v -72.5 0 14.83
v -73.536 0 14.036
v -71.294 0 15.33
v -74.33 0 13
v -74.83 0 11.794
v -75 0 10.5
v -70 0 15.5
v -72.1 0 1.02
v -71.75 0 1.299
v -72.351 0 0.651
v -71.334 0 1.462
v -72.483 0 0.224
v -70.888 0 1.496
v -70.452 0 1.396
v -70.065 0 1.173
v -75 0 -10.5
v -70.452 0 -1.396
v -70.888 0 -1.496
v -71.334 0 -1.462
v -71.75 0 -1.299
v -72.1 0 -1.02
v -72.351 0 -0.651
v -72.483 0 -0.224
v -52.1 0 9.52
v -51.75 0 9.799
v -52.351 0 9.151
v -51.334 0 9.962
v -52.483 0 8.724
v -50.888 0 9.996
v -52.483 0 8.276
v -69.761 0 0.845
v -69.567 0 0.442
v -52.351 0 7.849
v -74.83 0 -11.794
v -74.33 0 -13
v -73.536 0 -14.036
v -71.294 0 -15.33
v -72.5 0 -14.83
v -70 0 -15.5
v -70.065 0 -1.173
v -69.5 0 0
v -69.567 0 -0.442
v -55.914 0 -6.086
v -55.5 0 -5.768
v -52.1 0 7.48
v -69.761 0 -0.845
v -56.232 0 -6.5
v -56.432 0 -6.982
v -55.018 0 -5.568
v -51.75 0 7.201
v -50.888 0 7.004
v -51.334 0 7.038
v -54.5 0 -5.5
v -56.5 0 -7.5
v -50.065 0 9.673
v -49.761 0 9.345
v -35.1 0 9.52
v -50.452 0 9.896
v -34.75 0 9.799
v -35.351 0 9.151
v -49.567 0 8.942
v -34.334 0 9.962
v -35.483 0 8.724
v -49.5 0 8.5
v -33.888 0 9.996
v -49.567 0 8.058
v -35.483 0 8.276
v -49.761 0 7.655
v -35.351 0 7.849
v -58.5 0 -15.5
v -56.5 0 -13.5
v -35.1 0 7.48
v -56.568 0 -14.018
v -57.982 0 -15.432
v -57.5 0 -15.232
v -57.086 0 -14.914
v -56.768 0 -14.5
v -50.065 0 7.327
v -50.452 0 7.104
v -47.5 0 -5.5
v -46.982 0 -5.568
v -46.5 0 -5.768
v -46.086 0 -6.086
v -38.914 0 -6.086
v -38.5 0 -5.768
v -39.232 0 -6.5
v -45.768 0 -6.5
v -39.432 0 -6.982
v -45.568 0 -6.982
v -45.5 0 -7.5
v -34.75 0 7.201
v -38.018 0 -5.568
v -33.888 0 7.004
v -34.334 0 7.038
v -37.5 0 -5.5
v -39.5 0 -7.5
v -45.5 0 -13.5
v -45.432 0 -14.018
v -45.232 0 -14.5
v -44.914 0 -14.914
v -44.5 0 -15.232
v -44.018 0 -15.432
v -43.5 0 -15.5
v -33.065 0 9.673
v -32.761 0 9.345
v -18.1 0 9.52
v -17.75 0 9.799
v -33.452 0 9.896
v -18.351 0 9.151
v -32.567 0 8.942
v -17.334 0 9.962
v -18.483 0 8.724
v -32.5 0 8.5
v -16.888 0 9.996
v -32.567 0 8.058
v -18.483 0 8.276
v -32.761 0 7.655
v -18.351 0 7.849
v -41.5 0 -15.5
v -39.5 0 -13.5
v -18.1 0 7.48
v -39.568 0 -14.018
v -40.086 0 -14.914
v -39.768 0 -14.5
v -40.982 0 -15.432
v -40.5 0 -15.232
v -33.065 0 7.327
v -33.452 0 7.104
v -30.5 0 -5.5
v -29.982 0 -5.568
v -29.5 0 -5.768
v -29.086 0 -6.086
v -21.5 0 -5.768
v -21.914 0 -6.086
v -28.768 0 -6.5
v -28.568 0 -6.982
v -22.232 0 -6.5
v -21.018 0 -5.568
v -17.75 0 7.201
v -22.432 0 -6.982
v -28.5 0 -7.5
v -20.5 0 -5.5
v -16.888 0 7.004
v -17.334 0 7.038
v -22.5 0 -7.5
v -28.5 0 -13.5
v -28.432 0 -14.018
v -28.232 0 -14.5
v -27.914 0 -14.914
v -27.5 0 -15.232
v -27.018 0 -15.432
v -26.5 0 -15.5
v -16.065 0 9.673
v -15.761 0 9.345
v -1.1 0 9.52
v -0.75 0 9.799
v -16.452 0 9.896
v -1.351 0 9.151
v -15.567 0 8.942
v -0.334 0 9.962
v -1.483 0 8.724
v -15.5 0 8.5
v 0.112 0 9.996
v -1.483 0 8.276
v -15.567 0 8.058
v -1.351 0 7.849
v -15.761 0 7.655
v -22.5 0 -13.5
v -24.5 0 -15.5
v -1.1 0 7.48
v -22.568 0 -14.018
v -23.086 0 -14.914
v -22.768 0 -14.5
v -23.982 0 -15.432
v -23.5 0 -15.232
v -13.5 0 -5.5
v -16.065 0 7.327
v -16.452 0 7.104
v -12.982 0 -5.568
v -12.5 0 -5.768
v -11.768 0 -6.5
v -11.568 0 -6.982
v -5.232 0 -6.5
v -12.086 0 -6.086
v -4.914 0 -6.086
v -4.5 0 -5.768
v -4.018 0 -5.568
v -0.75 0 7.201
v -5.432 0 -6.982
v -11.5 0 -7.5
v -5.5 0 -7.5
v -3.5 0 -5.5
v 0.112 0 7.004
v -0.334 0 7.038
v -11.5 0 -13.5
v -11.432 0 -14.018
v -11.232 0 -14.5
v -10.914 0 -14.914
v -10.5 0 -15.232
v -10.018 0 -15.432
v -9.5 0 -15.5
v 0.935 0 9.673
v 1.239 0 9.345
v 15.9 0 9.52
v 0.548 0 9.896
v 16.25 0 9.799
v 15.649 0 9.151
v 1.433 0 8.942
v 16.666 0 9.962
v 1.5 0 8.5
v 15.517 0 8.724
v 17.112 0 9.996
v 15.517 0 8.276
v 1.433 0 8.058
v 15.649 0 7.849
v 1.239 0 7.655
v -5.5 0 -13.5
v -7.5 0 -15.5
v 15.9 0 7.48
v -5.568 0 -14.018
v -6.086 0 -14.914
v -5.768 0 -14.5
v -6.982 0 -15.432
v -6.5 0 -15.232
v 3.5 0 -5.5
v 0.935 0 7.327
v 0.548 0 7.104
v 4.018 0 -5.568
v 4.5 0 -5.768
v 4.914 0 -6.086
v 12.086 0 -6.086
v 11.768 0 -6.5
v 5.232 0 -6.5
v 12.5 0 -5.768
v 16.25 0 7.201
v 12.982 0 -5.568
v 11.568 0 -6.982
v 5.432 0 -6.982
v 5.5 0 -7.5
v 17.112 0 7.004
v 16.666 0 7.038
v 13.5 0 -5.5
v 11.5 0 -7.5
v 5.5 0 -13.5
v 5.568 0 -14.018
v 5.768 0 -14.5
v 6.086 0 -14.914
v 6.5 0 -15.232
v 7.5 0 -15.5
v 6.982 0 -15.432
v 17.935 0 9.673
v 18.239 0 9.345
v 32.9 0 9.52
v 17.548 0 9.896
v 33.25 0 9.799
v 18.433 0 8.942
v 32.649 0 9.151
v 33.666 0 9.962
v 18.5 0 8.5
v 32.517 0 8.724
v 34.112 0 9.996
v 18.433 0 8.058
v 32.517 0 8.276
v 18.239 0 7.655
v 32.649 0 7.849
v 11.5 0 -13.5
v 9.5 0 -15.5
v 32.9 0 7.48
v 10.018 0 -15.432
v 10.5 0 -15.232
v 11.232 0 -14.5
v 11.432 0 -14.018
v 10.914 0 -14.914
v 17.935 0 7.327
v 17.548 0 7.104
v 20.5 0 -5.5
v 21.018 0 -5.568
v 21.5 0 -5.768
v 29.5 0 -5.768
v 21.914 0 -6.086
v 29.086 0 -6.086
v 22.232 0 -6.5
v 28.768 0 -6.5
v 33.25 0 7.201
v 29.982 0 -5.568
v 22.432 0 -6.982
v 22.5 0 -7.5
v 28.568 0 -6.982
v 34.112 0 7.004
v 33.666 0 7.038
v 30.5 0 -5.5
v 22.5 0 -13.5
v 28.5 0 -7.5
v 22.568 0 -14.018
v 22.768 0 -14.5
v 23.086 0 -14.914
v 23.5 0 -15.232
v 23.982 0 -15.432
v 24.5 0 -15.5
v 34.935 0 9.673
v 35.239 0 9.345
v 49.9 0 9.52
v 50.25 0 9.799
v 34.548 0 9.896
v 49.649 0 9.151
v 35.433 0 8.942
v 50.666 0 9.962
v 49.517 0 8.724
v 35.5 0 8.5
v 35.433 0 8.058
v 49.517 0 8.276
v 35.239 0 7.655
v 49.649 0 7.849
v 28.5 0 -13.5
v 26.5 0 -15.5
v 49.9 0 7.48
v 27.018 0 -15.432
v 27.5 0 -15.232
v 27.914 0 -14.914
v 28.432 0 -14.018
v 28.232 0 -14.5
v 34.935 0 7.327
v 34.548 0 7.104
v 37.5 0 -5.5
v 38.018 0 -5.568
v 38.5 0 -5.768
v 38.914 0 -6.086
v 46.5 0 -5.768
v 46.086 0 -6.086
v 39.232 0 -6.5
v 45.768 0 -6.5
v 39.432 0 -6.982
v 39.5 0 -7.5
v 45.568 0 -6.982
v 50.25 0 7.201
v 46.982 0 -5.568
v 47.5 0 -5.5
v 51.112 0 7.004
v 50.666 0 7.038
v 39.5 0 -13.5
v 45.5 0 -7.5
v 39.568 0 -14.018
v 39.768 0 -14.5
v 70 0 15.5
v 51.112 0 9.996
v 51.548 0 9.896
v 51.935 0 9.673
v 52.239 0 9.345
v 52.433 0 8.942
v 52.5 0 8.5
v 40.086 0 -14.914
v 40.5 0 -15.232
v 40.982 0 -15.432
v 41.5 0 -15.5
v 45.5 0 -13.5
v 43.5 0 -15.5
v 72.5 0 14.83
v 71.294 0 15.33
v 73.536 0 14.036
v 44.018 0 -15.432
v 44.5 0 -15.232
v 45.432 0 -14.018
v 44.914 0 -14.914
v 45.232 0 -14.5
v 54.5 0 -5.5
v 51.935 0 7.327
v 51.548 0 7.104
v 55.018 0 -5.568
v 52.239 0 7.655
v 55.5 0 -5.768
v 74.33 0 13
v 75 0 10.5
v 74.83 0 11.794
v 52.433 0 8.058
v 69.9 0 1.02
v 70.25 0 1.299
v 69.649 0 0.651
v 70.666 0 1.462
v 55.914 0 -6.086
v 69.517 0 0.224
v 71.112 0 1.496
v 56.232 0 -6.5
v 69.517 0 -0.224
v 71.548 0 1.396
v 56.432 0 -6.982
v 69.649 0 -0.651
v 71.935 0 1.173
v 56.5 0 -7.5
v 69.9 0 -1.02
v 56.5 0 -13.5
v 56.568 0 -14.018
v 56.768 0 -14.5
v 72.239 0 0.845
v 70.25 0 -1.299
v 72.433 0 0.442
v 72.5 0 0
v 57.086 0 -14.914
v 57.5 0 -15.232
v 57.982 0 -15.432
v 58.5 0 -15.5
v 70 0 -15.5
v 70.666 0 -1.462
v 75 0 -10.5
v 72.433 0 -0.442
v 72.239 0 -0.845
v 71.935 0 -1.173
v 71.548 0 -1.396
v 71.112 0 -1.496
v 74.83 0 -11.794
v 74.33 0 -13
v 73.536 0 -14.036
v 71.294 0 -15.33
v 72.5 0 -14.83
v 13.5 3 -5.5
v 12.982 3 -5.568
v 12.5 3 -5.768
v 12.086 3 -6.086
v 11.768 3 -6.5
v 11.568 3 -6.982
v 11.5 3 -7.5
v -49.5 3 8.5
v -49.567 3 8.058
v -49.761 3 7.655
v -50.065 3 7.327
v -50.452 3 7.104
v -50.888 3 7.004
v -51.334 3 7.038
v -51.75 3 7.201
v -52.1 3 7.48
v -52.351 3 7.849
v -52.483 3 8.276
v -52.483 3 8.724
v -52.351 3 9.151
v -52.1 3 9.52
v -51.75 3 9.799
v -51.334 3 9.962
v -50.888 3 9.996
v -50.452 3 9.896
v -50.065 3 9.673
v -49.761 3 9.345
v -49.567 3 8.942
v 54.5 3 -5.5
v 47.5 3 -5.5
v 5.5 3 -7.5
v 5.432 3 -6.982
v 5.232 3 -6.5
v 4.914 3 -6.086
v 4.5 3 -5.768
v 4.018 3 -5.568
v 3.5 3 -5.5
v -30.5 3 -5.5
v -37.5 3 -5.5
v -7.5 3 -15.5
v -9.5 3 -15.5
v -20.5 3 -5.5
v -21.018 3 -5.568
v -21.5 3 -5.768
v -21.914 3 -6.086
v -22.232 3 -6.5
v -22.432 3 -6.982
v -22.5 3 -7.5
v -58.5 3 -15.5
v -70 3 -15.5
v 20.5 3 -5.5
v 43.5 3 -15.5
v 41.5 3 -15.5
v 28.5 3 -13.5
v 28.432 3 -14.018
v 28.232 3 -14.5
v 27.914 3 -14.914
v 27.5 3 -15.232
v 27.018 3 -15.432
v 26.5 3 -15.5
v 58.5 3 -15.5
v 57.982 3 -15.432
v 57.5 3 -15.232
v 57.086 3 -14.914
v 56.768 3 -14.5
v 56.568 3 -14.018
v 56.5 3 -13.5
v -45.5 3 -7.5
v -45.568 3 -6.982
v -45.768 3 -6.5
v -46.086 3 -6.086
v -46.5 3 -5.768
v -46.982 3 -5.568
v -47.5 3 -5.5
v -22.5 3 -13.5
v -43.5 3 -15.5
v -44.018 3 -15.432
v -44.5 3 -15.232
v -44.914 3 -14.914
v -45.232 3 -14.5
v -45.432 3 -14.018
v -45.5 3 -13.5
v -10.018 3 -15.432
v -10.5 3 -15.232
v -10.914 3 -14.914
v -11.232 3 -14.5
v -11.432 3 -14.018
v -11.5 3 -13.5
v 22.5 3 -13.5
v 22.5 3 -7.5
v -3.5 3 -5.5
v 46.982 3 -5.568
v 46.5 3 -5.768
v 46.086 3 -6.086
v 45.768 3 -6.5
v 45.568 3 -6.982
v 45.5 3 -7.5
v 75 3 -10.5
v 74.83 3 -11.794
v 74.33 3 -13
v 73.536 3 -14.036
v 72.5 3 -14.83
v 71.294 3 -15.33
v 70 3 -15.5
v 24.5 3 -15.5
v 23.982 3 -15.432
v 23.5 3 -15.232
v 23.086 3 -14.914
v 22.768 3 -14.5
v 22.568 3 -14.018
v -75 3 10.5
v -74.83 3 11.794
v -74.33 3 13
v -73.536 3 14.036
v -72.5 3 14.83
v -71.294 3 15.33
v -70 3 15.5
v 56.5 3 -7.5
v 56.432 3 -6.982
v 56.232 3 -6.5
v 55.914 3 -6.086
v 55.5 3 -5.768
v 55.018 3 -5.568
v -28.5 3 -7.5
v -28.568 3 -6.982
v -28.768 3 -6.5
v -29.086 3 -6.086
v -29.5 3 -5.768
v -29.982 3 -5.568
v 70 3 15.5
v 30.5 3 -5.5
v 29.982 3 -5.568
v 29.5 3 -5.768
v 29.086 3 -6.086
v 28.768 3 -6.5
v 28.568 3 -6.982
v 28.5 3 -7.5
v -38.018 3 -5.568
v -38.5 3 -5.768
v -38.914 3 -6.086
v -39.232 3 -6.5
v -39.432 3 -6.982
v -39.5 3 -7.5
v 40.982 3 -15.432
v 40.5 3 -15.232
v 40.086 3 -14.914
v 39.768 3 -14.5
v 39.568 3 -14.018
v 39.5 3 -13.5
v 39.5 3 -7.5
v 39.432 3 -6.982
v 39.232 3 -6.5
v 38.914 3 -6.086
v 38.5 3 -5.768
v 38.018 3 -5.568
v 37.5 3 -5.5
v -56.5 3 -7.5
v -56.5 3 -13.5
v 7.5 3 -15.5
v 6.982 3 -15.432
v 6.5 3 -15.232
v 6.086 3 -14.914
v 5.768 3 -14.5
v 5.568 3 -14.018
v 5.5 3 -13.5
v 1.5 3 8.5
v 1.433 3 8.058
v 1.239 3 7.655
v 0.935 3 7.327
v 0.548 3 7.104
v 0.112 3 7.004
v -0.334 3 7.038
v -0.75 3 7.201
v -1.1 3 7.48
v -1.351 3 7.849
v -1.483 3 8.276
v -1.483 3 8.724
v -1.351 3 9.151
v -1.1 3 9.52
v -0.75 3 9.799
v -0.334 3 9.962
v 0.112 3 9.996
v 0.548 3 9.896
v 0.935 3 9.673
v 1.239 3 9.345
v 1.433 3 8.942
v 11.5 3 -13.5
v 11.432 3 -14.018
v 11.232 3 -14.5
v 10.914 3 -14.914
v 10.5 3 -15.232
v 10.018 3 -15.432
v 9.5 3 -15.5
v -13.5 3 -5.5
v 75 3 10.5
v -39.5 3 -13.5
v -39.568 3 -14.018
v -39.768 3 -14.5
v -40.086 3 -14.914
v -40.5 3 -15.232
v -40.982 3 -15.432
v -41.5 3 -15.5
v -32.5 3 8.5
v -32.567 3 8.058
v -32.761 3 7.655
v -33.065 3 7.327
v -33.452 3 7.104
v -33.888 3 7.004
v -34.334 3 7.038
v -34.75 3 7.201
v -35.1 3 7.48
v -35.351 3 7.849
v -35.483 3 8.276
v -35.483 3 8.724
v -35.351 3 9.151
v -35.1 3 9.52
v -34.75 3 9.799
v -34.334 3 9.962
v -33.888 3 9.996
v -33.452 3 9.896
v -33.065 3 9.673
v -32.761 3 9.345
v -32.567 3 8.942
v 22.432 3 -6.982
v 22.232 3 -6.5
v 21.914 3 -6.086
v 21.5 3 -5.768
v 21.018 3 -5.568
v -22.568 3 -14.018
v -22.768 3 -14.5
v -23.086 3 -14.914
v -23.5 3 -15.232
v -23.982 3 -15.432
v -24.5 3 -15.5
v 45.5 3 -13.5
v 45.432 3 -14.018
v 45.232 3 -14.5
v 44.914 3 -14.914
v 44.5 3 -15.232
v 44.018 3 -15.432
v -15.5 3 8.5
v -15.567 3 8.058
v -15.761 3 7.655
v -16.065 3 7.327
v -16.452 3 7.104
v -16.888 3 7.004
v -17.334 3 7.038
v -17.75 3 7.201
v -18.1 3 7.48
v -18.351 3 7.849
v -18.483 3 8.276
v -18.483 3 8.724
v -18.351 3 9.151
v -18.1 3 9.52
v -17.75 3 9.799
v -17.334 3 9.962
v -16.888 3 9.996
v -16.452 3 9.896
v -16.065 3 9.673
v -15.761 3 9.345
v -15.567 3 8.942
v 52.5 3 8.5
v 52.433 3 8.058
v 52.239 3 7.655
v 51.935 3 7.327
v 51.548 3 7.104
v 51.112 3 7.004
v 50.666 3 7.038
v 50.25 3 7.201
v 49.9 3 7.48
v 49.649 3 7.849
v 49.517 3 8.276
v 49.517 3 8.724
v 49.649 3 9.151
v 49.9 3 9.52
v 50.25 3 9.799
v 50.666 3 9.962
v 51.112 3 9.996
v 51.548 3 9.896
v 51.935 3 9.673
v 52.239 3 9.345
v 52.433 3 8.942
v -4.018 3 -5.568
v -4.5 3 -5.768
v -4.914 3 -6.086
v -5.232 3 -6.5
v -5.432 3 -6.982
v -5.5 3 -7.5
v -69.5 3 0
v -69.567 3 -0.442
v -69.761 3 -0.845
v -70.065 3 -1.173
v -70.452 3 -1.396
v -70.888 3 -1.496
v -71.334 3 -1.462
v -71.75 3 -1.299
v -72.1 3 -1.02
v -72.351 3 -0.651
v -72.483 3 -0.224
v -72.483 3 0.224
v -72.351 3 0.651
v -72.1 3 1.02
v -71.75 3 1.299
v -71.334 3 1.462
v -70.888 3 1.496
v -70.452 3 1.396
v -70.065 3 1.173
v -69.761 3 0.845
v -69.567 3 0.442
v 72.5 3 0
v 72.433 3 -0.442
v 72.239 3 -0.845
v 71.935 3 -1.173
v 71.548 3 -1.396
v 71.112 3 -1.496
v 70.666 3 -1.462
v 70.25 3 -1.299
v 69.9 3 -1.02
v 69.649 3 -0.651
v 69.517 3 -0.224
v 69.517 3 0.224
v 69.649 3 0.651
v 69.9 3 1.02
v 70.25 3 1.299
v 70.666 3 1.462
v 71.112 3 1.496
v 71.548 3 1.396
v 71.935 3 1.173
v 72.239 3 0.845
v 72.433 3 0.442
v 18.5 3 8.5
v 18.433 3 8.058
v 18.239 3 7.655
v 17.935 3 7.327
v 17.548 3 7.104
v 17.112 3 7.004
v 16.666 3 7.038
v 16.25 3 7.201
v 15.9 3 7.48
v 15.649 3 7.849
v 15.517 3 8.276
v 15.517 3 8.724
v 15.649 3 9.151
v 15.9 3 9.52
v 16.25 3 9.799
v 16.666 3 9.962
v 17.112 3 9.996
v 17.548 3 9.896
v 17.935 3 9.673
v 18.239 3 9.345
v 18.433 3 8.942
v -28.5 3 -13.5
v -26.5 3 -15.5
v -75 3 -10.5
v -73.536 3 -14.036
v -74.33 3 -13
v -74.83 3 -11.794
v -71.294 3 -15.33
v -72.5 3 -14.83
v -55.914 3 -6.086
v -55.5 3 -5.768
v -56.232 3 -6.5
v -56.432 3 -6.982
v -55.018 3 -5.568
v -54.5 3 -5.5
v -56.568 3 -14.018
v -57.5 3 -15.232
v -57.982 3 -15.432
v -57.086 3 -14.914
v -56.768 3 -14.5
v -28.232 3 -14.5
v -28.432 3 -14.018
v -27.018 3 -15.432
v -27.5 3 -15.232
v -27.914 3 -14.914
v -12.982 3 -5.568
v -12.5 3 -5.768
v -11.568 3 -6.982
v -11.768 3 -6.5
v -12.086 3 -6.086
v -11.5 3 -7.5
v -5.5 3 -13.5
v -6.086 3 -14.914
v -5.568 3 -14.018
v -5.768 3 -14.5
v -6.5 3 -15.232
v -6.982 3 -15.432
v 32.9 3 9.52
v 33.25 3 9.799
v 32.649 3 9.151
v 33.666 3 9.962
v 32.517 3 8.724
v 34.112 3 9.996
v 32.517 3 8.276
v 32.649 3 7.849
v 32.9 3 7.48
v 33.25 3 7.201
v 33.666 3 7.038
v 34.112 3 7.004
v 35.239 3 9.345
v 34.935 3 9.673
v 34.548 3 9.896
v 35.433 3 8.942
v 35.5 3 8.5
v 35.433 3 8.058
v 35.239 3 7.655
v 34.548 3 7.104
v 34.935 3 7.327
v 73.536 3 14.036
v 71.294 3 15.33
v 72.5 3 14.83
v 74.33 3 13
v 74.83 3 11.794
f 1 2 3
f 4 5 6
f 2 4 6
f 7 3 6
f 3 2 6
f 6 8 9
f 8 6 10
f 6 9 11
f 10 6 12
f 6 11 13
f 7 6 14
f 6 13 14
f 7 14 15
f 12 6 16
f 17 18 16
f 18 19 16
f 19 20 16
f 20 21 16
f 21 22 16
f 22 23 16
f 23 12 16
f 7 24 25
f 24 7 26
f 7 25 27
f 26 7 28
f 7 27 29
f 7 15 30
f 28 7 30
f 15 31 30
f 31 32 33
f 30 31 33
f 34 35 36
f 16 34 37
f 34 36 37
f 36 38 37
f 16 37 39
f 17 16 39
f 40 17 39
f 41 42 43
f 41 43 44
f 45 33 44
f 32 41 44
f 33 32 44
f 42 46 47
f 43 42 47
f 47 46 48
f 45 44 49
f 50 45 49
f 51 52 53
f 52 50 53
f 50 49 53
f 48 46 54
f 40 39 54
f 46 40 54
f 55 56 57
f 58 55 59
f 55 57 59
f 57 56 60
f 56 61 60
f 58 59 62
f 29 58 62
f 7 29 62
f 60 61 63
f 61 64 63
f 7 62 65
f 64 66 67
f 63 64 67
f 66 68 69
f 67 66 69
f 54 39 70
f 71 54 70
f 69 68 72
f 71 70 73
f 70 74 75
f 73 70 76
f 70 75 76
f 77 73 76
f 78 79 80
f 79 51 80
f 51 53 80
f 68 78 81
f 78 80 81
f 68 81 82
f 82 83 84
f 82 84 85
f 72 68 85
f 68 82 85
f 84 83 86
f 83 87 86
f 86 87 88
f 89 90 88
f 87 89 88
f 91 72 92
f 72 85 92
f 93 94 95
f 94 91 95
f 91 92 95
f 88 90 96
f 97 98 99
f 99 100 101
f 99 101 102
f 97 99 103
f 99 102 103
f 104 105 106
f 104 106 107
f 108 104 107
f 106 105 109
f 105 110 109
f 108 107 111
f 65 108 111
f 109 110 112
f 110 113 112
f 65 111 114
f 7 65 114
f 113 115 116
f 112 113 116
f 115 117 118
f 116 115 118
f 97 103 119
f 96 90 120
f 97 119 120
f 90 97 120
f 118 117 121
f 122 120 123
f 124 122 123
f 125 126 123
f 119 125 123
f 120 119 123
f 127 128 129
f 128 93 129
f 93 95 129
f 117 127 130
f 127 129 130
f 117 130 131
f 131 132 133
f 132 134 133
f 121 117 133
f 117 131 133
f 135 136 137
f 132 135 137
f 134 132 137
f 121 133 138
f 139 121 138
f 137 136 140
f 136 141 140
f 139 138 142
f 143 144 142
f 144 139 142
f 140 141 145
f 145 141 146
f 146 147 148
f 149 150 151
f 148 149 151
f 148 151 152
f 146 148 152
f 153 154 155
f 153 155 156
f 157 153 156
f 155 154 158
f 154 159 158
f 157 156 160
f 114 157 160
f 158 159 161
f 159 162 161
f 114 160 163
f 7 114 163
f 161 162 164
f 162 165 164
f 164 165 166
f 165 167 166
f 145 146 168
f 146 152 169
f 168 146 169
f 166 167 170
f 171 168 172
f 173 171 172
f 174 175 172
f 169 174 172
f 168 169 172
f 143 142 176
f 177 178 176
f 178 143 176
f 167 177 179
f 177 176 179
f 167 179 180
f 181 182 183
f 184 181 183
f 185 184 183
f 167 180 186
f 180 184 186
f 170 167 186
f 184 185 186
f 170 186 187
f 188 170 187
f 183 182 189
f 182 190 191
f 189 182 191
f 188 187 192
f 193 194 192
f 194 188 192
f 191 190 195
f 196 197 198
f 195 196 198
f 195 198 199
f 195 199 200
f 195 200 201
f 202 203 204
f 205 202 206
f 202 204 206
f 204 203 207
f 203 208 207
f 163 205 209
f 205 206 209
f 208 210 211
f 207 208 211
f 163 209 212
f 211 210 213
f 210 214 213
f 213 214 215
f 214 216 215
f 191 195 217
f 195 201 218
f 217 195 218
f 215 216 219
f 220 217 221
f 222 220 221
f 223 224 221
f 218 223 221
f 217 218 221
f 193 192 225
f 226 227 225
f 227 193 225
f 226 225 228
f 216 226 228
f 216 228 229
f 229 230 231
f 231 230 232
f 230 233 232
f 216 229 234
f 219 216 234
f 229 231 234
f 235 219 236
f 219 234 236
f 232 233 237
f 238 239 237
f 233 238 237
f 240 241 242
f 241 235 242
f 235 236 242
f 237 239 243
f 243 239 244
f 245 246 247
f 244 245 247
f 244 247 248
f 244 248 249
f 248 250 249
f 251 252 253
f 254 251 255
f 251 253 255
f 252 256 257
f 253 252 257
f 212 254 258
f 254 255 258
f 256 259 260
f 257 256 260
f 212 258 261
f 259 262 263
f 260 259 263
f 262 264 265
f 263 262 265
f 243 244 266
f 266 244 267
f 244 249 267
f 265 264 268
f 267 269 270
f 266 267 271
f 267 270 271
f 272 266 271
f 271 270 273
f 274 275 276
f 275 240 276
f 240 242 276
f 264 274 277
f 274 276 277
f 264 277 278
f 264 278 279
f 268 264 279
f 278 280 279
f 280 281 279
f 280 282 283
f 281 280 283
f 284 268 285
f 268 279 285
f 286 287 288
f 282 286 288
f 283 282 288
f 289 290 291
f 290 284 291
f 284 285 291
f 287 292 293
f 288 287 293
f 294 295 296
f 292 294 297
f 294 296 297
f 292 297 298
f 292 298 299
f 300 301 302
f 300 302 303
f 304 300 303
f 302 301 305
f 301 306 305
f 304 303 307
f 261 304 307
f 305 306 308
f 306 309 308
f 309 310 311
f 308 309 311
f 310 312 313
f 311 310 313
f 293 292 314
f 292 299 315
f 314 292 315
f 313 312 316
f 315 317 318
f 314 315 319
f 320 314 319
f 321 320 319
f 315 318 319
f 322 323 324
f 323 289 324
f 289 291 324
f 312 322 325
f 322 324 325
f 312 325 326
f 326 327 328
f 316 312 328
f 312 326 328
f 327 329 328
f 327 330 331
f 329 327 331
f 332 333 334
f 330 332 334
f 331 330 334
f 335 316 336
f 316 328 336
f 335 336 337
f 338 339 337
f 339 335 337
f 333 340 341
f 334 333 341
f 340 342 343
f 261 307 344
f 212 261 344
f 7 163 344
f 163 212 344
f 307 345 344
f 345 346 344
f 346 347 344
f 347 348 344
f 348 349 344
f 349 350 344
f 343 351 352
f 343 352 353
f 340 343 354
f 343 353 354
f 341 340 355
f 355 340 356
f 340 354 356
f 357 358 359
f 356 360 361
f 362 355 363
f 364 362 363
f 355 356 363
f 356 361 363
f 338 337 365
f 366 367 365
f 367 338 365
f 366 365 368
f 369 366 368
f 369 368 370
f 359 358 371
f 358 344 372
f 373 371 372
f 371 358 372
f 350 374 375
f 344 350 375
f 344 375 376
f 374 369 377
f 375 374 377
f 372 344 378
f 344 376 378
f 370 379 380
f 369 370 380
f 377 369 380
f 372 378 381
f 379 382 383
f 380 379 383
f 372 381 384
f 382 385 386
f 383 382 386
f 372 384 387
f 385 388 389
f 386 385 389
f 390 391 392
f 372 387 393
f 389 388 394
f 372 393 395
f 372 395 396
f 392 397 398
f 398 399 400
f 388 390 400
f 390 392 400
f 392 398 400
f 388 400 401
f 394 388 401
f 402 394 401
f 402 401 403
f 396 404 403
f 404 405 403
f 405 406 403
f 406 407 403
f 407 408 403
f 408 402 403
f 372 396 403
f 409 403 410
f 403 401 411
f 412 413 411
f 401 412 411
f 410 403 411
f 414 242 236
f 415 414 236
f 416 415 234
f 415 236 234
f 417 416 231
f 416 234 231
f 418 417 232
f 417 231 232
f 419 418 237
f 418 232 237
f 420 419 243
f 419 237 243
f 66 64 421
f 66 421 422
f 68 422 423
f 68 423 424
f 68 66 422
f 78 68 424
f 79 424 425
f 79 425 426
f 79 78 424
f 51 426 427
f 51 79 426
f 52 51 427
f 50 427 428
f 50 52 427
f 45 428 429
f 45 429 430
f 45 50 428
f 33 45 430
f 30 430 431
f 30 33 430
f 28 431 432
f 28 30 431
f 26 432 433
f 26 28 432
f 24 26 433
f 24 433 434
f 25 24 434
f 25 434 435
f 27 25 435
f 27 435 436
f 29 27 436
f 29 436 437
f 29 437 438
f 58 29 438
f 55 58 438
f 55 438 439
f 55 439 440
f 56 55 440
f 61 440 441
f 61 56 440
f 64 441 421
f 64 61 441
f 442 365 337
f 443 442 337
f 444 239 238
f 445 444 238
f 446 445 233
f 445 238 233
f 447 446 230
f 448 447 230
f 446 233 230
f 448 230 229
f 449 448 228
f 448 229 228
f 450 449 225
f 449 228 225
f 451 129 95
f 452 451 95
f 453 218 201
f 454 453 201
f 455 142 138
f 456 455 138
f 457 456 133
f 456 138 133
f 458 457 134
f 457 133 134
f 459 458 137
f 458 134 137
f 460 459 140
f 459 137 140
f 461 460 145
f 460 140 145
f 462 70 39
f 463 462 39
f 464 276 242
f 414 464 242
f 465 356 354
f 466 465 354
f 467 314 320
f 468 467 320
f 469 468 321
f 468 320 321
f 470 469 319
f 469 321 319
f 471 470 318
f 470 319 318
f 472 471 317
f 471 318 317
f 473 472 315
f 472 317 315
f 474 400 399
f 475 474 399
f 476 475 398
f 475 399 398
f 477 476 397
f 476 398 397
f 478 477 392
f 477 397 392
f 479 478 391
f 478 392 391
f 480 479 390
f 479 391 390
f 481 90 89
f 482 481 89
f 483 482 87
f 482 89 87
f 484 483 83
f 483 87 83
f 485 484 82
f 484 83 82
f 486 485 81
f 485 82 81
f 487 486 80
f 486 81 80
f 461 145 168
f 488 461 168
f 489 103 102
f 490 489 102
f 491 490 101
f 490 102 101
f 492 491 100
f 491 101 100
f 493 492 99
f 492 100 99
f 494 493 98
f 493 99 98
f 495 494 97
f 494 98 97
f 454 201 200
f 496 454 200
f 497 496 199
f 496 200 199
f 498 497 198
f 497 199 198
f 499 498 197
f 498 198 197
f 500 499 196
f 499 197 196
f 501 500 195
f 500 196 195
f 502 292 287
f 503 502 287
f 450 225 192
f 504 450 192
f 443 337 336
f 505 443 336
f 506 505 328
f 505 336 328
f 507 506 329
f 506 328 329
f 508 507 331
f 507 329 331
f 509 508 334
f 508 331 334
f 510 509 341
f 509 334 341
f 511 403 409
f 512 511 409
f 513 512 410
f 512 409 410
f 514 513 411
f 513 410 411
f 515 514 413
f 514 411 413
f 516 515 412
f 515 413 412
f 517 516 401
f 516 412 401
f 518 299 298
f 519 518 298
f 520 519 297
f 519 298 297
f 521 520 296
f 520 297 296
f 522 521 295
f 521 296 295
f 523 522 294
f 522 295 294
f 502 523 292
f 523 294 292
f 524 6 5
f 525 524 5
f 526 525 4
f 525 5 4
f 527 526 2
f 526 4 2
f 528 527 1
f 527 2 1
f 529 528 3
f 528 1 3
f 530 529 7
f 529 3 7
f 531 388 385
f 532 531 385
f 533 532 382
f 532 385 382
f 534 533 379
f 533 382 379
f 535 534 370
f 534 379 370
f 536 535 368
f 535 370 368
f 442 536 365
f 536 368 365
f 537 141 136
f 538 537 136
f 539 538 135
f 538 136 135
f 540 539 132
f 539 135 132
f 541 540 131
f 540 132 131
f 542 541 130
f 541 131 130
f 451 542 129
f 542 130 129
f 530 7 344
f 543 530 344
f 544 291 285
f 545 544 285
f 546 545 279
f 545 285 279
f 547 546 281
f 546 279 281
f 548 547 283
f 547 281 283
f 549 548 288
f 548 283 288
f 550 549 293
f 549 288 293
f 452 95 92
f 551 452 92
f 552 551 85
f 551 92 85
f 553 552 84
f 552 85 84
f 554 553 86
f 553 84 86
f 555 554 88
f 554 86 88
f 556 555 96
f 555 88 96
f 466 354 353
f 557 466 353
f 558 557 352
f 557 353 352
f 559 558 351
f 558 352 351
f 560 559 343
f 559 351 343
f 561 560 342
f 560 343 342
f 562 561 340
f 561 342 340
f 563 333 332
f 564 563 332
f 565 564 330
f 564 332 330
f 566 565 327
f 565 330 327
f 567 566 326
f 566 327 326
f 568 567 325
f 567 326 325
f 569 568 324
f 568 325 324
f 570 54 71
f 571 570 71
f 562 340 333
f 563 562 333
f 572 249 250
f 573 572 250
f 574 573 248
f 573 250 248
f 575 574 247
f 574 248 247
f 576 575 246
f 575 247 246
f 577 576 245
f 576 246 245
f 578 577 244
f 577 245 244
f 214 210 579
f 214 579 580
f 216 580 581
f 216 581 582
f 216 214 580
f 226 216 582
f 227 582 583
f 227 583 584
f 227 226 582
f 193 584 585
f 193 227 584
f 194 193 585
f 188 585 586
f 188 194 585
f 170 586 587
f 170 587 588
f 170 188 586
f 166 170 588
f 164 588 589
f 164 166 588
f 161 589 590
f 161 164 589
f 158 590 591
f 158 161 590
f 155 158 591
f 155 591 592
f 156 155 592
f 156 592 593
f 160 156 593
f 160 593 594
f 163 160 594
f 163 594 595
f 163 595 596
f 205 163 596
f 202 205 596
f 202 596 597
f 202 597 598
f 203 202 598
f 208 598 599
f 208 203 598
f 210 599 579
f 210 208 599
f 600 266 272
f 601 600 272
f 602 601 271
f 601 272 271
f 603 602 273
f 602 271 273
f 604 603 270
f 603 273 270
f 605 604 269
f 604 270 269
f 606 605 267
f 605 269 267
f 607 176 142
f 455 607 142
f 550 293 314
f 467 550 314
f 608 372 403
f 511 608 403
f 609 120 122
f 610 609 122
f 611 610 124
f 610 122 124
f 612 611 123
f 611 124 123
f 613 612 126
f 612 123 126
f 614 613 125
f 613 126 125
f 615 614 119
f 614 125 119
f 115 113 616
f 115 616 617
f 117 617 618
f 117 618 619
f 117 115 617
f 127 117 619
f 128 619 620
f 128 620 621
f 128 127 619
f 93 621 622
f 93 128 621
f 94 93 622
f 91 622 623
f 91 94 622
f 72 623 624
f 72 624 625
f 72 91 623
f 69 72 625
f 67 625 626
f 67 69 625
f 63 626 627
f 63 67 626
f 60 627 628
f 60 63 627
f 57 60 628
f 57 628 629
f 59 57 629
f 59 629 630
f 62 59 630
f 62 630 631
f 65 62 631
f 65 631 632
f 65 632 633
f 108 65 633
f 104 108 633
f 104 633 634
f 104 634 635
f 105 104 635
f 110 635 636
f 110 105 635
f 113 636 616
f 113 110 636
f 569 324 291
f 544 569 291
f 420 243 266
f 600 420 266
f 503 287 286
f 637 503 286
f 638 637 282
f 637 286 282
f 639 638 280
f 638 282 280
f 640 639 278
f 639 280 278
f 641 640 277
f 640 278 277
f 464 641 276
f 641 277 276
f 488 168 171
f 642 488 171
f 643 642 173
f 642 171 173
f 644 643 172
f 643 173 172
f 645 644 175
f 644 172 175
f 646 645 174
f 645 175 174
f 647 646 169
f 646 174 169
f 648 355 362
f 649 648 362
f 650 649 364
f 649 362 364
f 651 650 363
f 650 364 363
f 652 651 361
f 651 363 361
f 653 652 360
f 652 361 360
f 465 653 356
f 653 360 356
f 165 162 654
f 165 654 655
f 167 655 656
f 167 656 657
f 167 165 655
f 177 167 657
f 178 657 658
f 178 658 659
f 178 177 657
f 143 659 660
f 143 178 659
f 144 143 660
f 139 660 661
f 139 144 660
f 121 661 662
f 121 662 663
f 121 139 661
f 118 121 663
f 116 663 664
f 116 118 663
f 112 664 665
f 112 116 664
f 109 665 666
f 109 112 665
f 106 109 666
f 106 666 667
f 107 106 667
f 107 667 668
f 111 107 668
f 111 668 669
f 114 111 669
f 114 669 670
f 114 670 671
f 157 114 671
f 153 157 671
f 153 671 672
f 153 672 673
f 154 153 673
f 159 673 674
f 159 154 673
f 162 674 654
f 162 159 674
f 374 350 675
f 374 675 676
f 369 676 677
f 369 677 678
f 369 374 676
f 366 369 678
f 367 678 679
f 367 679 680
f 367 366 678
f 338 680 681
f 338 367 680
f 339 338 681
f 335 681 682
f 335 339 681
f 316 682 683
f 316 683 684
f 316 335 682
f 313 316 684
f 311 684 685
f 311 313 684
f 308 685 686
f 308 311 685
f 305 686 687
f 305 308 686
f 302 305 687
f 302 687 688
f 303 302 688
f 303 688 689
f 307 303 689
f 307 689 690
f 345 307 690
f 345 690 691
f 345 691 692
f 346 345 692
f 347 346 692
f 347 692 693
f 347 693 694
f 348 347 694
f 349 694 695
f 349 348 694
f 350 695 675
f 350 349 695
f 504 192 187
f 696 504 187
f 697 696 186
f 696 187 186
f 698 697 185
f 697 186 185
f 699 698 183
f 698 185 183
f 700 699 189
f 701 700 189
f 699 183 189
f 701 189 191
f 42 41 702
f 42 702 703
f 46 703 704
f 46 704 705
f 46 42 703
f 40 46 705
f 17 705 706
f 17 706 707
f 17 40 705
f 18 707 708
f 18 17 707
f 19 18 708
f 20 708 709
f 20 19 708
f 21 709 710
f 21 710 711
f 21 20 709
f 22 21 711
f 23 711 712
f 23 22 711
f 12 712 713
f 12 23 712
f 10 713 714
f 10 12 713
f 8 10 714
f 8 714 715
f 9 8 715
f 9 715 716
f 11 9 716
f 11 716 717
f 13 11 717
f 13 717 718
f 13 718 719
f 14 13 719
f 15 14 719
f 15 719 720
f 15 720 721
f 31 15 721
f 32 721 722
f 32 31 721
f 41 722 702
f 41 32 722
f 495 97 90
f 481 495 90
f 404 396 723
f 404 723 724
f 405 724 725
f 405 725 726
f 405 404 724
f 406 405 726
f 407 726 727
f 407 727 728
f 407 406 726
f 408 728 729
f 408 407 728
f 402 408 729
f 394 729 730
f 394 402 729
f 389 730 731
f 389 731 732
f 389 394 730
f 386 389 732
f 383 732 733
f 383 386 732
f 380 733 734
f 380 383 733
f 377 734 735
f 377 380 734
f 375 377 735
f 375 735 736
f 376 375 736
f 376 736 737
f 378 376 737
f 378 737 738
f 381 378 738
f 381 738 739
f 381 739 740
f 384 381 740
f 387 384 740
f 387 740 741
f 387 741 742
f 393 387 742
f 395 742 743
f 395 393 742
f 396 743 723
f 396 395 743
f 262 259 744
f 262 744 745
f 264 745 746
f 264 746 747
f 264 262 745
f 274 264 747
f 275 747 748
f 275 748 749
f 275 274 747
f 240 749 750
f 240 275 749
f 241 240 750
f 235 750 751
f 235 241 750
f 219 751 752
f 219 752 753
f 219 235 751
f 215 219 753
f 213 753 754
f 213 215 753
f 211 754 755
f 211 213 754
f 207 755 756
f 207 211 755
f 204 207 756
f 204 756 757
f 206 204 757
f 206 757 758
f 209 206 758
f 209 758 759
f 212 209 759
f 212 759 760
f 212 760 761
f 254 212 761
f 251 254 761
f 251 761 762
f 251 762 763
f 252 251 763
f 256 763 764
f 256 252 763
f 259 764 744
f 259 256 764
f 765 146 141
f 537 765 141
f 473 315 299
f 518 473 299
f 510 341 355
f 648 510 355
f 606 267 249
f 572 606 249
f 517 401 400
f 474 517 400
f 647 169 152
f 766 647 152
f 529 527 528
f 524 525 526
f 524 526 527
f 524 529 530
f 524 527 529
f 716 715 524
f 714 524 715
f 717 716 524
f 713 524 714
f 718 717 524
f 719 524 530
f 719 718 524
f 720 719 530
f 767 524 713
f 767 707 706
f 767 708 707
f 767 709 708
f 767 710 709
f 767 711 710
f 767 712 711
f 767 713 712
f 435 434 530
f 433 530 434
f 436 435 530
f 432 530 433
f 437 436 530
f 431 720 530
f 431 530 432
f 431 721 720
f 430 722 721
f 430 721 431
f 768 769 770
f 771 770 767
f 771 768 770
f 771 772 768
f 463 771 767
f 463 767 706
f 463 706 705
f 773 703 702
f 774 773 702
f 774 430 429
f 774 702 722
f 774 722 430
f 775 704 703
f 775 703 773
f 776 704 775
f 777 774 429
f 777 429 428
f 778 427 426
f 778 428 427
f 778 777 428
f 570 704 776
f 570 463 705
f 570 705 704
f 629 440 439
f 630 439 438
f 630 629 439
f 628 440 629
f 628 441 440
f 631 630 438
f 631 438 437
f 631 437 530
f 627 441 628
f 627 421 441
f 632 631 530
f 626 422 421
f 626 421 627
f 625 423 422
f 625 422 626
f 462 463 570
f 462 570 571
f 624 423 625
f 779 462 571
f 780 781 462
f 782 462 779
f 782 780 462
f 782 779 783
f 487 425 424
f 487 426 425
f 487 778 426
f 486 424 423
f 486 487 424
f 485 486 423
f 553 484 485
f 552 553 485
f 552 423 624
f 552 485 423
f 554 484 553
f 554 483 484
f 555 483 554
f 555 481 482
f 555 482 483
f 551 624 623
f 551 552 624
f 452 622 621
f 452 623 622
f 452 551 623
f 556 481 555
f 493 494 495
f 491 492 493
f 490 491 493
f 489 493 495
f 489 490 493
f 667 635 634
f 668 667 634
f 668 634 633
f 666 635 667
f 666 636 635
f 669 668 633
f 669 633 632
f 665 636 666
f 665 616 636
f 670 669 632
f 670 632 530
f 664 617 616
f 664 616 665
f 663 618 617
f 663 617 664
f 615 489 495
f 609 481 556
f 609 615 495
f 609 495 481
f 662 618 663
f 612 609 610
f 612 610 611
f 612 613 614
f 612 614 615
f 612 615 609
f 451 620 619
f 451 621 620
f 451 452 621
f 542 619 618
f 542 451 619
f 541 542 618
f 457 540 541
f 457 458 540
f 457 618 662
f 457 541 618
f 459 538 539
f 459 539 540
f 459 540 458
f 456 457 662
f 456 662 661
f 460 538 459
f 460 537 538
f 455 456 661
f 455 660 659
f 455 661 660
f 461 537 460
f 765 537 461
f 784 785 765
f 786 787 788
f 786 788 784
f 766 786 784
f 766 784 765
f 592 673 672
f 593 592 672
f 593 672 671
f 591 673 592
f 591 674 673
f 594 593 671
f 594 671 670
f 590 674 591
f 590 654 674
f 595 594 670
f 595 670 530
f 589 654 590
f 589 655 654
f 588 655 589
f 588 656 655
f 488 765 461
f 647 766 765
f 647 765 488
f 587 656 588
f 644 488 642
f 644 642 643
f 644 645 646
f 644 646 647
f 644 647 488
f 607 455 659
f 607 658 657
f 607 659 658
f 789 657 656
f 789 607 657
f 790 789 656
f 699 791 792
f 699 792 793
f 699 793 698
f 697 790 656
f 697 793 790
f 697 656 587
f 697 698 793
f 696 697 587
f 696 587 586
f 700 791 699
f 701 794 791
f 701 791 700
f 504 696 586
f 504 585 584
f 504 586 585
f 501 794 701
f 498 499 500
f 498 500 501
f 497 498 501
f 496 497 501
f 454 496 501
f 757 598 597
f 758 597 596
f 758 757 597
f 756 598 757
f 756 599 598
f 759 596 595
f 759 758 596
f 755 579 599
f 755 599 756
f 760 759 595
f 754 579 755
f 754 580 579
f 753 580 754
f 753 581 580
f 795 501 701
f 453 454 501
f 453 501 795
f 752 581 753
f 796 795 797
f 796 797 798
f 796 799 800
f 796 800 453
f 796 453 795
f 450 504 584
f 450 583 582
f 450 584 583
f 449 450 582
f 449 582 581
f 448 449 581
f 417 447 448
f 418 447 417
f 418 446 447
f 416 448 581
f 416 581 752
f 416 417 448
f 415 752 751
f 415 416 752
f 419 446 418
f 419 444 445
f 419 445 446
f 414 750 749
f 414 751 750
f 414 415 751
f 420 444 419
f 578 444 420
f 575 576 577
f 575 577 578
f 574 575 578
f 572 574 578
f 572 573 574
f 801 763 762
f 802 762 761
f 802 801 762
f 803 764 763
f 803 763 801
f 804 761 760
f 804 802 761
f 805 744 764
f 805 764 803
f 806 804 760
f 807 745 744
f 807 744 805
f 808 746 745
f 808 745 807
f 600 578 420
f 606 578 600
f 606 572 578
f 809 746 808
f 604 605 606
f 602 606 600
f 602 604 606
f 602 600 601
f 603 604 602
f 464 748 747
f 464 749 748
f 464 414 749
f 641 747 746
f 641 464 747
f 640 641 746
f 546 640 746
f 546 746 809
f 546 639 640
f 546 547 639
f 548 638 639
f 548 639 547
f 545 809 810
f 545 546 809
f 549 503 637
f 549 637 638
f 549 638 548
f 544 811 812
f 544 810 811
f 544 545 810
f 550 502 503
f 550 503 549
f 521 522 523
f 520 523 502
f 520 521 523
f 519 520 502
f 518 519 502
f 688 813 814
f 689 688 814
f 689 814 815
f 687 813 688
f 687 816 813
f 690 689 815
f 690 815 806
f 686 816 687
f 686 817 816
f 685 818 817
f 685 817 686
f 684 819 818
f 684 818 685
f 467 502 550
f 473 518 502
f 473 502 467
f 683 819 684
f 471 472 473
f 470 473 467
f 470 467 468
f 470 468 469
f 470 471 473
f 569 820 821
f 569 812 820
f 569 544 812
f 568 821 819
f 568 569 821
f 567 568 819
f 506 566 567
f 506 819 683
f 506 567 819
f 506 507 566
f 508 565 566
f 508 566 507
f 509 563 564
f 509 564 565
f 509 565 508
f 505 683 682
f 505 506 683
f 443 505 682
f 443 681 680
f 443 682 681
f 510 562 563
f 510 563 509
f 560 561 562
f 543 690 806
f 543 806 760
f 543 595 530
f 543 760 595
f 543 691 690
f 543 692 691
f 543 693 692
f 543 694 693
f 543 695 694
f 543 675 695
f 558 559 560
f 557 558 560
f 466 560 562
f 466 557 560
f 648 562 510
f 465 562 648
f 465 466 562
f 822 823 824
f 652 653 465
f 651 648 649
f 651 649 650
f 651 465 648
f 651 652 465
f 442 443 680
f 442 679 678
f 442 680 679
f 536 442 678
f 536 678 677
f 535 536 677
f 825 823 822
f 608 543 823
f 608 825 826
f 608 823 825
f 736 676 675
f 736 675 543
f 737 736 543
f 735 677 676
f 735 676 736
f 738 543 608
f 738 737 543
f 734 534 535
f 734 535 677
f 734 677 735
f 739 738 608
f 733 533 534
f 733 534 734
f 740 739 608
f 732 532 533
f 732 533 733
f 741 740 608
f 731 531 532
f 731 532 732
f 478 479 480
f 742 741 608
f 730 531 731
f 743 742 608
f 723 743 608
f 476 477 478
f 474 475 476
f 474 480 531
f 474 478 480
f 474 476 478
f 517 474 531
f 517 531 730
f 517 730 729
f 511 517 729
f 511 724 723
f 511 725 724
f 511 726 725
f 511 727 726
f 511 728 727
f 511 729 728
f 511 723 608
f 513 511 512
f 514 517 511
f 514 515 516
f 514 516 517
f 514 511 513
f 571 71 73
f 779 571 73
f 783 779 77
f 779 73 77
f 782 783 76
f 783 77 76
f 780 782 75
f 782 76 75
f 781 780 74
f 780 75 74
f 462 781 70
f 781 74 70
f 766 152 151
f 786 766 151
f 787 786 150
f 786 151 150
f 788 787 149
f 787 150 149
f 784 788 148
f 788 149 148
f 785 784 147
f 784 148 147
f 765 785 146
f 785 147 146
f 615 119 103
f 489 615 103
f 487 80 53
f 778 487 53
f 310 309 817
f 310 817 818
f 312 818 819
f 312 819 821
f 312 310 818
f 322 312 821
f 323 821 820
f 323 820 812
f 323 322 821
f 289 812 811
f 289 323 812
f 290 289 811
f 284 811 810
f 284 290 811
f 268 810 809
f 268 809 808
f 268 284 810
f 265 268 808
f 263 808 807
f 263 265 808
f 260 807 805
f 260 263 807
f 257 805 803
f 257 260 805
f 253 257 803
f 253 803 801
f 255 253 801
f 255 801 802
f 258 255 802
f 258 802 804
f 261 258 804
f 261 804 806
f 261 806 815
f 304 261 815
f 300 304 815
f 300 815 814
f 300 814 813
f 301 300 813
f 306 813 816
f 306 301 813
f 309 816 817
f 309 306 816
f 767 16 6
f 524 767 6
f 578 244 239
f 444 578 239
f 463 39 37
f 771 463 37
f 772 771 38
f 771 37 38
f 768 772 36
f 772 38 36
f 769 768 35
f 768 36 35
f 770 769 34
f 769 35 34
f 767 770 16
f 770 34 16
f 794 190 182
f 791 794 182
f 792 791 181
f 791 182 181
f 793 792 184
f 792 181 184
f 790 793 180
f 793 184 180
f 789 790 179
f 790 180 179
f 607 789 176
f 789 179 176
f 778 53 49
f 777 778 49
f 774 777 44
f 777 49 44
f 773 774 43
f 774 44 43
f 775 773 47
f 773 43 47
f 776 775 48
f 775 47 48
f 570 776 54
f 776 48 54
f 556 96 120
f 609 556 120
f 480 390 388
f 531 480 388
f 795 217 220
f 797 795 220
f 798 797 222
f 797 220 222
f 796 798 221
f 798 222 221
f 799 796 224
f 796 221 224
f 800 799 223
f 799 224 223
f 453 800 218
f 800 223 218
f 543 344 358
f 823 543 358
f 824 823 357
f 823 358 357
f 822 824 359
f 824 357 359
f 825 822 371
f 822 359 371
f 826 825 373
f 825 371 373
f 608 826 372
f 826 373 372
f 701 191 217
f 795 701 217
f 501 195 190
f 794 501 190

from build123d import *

# Parameters (mm, degrees)
SKETCH1_R           = 1.5
BOSS_EXTRUDE1_DEPTH = 3


with BuildPart() as part:
    # Sketch1 → Boss-Extrude1 (new body)
    with BuildSketch(Plane(origin=(0, 0, 0), x_dir=(1, 0, 0), z_dir=(0, 1, 0))):
        with BuildLine():
            Line((70, 15.5), (58.5, 15.5))
            ThreePointArc((58.5, 15.5), (57.085786438, 14.914213562), (56.5, 13.5))
            Line((56.5, 13.5), (56.5, 7.5))
            ThreePointArc((56.5, 7.5), (55.914213562, 6.085786438), (54.5, 5.5))
            Line((54.5, 5.5), (47.5, 5.5))
            ThreePointArc((47.5, 5.5), (46.085786438, 6.085786438), (45.5, 7.5))
            Line((45.5, 7.5), (45.5, 13.5))
            ThreePointArc((45.5, 13.5), (44.914213562, 14.914213562), (43.5, 15.5))
            Line((43.5, 15.5), (41.5, 15.5))
            ThreePointArc((41.5, 15.5), (40.085786438, 14.914213562), (39.5, 13.5))
            Line((39.5, 13.5), (39.5, 7.5))
            ThreePointArc((39.5, 7.5), (38.914213562, 6.085786438), (37.5, 5.5))
            Line((37.5, 5.5), (30.5, 5.5))
            ThreePointArc((30.5, 5.5), (29.085786438, 6.085786438), (28.5, 7.5))
            Line((28.5, 7.5), (28.5, 13.5))
            ThreePointArc((28.5, 13.5), (27.914213562, 14.914213562), (26.5, 15.5))
            Line((26.5, 15.5), (24.5, 15.5))
            ThreePointArc((24.5, 15.5), (23.085786438, 14.914213562), (22.5, 13.5))
            Line((22.5, 13.5), (22.5, 7.5))
            ThreePointArc((22.5, 7.5), (21.914213562, 6.085786438), (20.5, 5.5))
            Line((20.5, 5.5), (13.5, 5.5))
            ThreePointArc((13.5, 5.5), (12.085786438, 6.085786438), (11.5, 7.5))
            Line((11.5, 7.5), (11.5, 13.5))
            ThreePointArc((11.5, 13.5), (10.914213562, 14.914213562), (9.5, 15.5))
            Line((9.5, 15.5), (7.5, 15.5))
            ThreePointArc((7.5, 15.5), (6.085786438, 14.914213562), (5.5, 13.5))
            Line((5.5, 13.5), (5.5, 7.5))
            ThreePointArc((5.5, 7.5), (4.914213562, 6.085786438), (3.5, 5.5))
            Line((3.5, 5.5), (-3.5, 5.5))
            ThreePointArc((-3.5, 5.5), (-4.914213562, 6.085786438), (-5.5, 7.5))
            Line((-5.5, 7.5), (-5.5, 13.5))
            ThreePointArc((-5.5, 13.5), (-6.085786438, 14.914213562), (-7.5, 15.5))
            Line((-7.5, 15.5), (-9.5, 15.5))
            ThreePointArc((-9.5, 15.5), (-10.914213562, 14.914213562), (-11.5, 13.5))
            Line((-11.5, 13.5), (-11.5, 7.5))
            ThreePointArc((-11.5, 7.5), (-12.085786438, 6.085786438), (-13.5, 5.5))
            Line((-13.5, 5.5), (-20.5, 5.5))
            ThreePointArc((-20.5, 5.5), (-21.914213562, 6.085786438), (-22.5, 7.5))
            Line((-22.5, 7.5), (-22.5, 13.5))
            ThreePointArc((-22.5, 13.5), (-23.085786438, 14.914213562), (-24.5, 15.5))
            Line((-24.5, 15.5), (-26.5, 15.5))
            ThreePointArc((-26.5, 15.5), (-27.914213562, 14.914213562), (-28.5, 13.5))
            Line((-28.5, 13.5), (-28.5, 7.5))
            ThreePointArc((-28.5, 7.5), (-29.085786438, 6.085786438), (-30.5, 5.5))
            Line((-30.5, 5.5), (-37.5, 5.5))
            ThreePointArc((-37.5, 5.5), (-38.914213562, 6.085786438), (-39.5, 7.5))
            Line((-39.5, 7.5), (-39.5, 13.5))
            ThreePointArc((-39.5, 13.5), (-40.085786438, 14.914213562), (-41.5, 15.5))
            Line((-41.5, 15.5), (-43.5, 15.5))
            ThreePointArc((-43.5, 15.5), (-44.914213562, 14.914213562), (-45.5, 13.5))
            Line((-45.5, 13.5), (-45.5, 7.5))
            ThreePointArc((-45.5, 7.5), (-46.085786438, 6.085786438), (-47.5, 5.5))
            Line((-47.5, 5.5), (-54.5, 5.5))
            ThreePointArc((-54.5, 5.5), (-55.914213562, 6.085786438), (-56.5, 7.5))
            Line((-56.5, 7.5), (-56.5, 13.5))
            ThreePointArc((-56.5, 13.5), (-57.085786438, 14.914213562), (-58.5, 15.5))
            Line((-58.5, 15.5), (-70, 15.5))
            ThreePointArc((-70, 15.5), (-73.535533906, 14.035533906), (-75, 10.5))
            Line((-75, 10.5), (-75, -10.5))
            ThreePointArc((-75, -10.5), (-73.535533906, -14.035533906), (-70, -15.5))
            Line((-70, -15.5), (70, -15.5))
            ThreePointArc((70, -15.5), (73.535533906, -14.035533906), (75, -10.5))
            Line((75, -10.5), (75, 10.5))
            ThreePointArc((75, 10.5), (73.535533906, 14.035533906), (70, 15.5))
        make_face()
        with Locations((71, 0)):
            Circle(SKETCH1_R, mode=Mode.SUBTRACT)
        with Locations((-51, -8.5)):
            Circle(SKETCH1_R, mode=Mode.SUBTRACT)
        with Locations((-34, -8.5)):
            Circle(SKETCH1_R, mode=Mode.SUBTRACT)
        with Locations((-17, -8.5)):
            Circle(SKETCH1_R, mode=Mode.SUBTRACT)
        with Locations((0, -8.5)):
            Circle(SKETCH1_R, mode=Mode.SUBTRACT)
        with Locations((17, -8.5)):
            Circle(SKETCH1_R, mode=Mode.SUBTRACT)
        with Locations((34, -8.5)):
            Circle(SKETCH1_R, mode=Mode.SUBTRACT)
        with Locations((51, -8.5)):
            Circle(SKETCH1_R, mode=Mode.SUBTRACT)
        with Locations((-71, 0)):
            Circle(SKETCH1_R, mode=Mode.SUBTRACT)
    extrude(amount=BOSS_EXTRUDE1_DEPTH)


solid = part.part
